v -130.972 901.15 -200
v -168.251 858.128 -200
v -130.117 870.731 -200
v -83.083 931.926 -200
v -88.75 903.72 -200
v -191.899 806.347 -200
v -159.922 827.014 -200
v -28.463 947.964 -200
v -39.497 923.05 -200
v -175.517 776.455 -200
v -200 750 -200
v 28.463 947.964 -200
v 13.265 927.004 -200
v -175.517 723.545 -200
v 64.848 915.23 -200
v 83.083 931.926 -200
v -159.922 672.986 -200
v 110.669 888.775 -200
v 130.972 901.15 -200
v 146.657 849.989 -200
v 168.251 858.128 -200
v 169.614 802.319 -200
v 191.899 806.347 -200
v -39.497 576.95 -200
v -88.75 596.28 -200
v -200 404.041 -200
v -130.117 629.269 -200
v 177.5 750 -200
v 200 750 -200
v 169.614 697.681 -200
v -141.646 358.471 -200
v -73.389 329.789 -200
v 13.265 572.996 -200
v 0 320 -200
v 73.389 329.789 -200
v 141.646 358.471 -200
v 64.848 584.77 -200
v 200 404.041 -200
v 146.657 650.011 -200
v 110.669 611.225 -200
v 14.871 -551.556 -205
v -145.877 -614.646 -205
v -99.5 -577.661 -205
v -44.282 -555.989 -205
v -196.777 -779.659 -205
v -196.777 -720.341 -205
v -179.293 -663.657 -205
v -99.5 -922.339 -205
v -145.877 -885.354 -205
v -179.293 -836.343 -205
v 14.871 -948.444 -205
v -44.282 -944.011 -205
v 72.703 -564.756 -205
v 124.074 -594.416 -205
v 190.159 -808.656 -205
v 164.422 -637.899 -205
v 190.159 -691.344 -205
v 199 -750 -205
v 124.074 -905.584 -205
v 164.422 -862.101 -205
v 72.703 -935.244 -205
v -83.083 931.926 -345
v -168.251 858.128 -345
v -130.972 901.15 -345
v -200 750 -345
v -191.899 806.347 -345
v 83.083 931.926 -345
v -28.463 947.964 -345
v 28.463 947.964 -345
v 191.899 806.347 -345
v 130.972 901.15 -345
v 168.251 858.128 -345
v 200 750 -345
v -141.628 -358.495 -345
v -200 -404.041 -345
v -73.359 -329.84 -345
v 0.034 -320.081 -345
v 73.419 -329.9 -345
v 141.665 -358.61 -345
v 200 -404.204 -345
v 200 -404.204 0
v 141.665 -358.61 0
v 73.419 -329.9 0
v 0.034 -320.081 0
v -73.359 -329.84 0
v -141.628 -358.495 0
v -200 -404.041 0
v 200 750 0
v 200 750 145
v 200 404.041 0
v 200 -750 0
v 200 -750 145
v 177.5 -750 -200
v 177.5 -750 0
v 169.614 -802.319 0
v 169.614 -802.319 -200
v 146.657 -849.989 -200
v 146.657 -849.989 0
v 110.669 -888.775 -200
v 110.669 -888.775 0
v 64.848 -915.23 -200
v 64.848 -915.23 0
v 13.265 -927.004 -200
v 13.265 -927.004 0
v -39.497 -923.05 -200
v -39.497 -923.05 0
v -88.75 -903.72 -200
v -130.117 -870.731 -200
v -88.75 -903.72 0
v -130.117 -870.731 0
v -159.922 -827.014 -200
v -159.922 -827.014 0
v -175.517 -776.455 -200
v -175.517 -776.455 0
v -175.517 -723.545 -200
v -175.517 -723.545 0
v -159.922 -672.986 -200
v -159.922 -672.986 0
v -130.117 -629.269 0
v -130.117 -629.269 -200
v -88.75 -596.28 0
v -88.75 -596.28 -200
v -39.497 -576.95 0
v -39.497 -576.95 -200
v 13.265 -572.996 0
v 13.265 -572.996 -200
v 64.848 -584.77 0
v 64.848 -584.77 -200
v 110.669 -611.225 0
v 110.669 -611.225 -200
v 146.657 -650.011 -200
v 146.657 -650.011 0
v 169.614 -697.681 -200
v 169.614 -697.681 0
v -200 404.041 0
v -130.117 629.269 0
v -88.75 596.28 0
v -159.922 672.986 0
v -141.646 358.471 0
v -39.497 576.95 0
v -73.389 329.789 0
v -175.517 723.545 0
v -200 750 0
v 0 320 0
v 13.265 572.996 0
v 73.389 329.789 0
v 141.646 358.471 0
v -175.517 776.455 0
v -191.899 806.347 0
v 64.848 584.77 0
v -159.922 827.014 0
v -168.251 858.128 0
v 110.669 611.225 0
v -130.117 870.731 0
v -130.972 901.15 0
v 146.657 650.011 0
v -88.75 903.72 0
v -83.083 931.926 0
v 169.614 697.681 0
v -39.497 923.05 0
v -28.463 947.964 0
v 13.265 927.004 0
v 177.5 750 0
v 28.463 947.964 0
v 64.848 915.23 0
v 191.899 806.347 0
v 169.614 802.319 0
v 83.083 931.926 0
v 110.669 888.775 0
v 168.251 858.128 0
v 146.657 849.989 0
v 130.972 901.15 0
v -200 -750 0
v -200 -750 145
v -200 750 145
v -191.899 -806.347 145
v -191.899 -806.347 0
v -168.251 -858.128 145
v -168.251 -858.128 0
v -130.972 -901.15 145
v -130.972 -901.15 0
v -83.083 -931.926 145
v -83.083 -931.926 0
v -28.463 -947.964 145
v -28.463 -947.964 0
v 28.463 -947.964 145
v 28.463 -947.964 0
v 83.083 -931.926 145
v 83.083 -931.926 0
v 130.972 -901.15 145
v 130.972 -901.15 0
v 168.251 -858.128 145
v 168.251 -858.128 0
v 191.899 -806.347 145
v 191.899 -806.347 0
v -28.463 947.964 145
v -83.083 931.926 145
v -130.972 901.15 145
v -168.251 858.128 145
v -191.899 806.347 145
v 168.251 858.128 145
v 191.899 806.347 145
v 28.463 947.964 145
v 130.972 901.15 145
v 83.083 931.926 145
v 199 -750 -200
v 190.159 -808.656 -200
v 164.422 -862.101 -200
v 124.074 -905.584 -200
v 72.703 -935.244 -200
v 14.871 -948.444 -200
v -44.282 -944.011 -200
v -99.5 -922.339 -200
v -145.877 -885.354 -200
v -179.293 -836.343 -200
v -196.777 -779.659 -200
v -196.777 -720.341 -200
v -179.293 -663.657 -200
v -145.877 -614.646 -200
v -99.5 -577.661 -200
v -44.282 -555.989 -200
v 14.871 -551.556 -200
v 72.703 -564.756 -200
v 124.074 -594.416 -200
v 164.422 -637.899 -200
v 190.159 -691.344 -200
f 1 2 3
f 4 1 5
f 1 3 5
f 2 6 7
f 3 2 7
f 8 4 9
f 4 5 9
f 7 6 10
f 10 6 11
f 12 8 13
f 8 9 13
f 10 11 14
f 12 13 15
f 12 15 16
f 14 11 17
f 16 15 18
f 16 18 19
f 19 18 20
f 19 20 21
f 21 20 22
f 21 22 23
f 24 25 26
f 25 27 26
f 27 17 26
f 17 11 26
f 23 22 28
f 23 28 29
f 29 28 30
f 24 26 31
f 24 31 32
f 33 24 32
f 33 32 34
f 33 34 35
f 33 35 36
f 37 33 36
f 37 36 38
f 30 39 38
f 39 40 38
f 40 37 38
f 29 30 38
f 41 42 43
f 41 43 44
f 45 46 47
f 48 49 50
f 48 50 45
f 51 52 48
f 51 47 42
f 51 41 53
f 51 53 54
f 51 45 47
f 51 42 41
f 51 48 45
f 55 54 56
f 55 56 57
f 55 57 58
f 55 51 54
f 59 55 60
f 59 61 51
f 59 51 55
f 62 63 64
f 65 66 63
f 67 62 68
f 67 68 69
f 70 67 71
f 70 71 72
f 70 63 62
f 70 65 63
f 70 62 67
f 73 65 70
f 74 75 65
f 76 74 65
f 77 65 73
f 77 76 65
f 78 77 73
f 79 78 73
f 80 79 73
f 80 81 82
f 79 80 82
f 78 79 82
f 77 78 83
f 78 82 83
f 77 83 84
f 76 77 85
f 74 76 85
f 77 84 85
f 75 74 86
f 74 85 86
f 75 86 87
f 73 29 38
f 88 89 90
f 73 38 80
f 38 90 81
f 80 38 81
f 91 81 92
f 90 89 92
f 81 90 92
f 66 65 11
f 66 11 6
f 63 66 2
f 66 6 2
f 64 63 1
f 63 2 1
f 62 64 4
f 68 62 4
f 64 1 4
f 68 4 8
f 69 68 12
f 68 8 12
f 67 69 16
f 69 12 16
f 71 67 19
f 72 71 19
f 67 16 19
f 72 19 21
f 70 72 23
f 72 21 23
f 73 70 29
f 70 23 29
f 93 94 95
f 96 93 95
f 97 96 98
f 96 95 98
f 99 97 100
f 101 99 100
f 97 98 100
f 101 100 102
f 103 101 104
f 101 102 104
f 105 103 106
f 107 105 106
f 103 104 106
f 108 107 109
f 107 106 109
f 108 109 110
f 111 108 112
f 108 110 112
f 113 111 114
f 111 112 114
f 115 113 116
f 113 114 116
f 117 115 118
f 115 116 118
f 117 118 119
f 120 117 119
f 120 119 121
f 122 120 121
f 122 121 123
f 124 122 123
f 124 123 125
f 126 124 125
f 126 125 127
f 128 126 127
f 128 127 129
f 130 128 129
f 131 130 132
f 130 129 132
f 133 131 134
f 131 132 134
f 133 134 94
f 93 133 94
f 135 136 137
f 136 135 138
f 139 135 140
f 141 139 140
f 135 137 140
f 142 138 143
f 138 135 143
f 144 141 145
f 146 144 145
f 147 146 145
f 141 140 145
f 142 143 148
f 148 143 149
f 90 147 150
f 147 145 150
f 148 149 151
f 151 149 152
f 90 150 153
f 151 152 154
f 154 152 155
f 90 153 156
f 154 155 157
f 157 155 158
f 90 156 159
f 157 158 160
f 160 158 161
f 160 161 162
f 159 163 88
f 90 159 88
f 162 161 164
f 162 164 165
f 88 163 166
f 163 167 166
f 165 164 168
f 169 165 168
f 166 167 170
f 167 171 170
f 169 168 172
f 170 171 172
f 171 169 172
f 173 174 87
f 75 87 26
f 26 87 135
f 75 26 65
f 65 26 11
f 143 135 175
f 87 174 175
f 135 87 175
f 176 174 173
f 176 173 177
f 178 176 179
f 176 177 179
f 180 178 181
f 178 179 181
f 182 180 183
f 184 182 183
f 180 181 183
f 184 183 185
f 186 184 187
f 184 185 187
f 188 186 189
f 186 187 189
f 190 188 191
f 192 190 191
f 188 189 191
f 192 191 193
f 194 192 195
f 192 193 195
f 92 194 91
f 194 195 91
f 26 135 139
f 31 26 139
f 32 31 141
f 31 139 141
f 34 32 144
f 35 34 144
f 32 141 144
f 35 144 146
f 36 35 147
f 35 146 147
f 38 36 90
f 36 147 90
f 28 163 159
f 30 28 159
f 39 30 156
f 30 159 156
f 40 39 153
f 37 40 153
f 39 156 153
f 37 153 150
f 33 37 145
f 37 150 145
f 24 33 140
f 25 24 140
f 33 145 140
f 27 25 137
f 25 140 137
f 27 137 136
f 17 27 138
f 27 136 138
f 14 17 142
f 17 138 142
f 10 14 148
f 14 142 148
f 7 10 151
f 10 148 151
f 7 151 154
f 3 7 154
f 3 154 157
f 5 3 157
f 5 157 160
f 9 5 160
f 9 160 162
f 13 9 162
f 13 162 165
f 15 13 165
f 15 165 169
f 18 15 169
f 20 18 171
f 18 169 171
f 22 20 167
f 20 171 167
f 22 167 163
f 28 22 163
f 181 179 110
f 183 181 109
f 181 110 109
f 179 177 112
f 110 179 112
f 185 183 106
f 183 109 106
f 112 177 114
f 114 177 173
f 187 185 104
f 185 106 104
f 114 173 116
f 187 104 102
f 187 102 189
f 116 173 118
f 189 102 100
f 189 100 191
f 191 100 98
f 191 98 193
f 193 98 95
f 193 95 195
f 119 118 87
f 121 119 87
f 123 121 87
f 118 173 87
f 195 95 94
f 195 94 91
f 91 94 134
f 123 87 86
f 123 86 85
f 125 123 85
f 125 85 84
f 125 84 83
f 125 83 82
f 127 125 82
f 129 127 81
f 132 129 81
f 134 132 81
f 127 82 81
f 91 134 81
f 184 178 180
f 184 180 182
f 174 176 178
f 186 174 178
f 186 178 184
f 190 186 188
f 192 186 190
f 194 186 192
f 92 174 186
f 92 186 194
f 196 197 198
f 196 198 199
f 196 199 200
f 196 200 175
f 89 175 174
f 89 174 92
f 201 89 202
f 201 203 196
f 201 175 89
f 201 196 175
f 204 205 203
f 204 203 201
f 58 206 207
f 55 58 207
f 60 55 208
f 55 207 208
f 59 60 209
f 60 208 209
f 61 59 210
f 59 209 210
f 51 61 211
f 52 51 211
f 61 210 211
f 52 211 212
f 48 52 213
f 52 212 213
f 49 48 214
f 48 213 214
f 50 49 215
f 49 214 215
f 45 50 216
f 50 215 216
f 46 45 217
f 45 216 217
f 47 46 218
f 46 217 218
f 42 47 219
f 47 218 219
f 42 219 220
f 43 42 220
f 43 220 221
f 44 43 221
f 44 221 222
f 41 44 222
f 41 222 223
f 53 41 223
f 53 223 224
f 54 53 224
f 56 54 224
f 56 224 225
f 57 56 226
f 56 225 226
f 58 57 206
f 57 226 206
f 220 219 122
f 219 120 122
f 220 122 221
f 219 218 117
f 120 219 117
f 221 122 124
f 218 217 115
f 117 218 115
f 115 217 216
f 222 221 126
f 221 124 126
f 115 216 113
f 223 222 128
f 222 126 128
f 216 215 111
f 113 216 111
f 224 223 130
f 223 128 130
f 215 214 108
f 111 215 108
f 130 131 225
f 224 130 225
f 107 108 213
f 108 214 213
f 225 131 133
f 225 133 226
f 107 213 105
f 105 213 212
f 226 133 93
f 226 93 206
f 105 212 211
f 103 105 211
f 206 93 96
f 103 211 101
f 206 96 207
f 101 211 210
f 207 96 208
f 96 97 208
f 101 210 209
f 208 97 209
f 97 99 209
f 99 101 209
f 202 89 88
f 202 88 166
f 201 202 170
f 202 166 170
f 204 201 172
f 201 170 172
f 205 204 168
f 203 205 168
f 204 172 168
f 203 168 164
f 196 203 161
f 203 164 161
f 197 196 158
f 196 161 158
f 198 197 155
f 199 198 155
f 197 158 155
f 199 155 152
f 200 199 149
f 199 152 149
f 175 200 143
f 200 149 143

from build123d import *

# Parameters (mm, degrees)
F0_W     = 400
F0_H     = 1500
F1_DEPTH = 145
F2_R     = 177.5
F3_DEPTH = 200
F5_DEPTH = 145
F6_R     = 199
F7_DEPTH = 5


with BuildPart() as f1:
    # F0 (on Top) → F1 (new body)
    with BuildSketch(Plane.XY):
        with BuildLine():
            ThreePointArc((200, 750), (0, 950), (-200, 750))
            Line((-200, 750), (200, 750))
        make_face()
        Rectangle(F0_W, F0_H)
        with BuildLine():
            Line((200, -750), (-200, -750))
            ThreePointArc((-200, -750), (0, -950), (200, -750))
        make_face()
    extrude(amount=F1_DEPTH)

    # F2 (on face) → F3 (join)
    with BuildSketch(Plane(origin=(0, 0, 0), x_dir=(1, 0, 0), z_dir=(0, 0, -1))):
        with Locations((0, 750)):
            Circle(F2_R)
        with Locations((0, -750)):
            Circle(F2_R)
        with BuildLine():
            ThreePointArc((200, 404.203802), (0.034243, 320.081481), (-200, 404.040821))
            Line((-200, 404.040821), (-200, -404.040821))
            ThreePointArc((-200, -404.040821), (0, -320), (200, -404.040821))
            Line((200, -404.040821), (200, 404.203802))
        make_face()
    extrude(amount=F3_DEPTH)

    # F4 (on face) → F5 (join)
    with BuildSketch(Plane(origin=(0, 0, -200), x_dir=(1, 0, 0), z_dir=(0, 0, -1))):
        with BuildLine():
            Line((-200, 404.040821), (-200, -750))
            Line((-200, -750), (200, -750))
            Line((200, -750), (200, 404.203802))
            ThreePointArc((200, 404.203802), (0.034243, 320.081481), (-200, 404.040821))
        make_face()
        with BuildLine():
            Line((200, -750), (-200, -750))
            ThreePointArc((-200, -750), (0, -950), (200, -750))
        make_face()
    extrude(amount=F5_DEPTH)

    # F6 (on face) → F7 (join)
    with BuildSketch(Plane(origin=(0, 0, -200), x_dir=(1, 0, 0), z_dir=(0, 0, -1))):
        with Locations((0, 750)):
            Circle(F6_R)
    extrude(amount=F7_DEPTH)


solid = f1.part
